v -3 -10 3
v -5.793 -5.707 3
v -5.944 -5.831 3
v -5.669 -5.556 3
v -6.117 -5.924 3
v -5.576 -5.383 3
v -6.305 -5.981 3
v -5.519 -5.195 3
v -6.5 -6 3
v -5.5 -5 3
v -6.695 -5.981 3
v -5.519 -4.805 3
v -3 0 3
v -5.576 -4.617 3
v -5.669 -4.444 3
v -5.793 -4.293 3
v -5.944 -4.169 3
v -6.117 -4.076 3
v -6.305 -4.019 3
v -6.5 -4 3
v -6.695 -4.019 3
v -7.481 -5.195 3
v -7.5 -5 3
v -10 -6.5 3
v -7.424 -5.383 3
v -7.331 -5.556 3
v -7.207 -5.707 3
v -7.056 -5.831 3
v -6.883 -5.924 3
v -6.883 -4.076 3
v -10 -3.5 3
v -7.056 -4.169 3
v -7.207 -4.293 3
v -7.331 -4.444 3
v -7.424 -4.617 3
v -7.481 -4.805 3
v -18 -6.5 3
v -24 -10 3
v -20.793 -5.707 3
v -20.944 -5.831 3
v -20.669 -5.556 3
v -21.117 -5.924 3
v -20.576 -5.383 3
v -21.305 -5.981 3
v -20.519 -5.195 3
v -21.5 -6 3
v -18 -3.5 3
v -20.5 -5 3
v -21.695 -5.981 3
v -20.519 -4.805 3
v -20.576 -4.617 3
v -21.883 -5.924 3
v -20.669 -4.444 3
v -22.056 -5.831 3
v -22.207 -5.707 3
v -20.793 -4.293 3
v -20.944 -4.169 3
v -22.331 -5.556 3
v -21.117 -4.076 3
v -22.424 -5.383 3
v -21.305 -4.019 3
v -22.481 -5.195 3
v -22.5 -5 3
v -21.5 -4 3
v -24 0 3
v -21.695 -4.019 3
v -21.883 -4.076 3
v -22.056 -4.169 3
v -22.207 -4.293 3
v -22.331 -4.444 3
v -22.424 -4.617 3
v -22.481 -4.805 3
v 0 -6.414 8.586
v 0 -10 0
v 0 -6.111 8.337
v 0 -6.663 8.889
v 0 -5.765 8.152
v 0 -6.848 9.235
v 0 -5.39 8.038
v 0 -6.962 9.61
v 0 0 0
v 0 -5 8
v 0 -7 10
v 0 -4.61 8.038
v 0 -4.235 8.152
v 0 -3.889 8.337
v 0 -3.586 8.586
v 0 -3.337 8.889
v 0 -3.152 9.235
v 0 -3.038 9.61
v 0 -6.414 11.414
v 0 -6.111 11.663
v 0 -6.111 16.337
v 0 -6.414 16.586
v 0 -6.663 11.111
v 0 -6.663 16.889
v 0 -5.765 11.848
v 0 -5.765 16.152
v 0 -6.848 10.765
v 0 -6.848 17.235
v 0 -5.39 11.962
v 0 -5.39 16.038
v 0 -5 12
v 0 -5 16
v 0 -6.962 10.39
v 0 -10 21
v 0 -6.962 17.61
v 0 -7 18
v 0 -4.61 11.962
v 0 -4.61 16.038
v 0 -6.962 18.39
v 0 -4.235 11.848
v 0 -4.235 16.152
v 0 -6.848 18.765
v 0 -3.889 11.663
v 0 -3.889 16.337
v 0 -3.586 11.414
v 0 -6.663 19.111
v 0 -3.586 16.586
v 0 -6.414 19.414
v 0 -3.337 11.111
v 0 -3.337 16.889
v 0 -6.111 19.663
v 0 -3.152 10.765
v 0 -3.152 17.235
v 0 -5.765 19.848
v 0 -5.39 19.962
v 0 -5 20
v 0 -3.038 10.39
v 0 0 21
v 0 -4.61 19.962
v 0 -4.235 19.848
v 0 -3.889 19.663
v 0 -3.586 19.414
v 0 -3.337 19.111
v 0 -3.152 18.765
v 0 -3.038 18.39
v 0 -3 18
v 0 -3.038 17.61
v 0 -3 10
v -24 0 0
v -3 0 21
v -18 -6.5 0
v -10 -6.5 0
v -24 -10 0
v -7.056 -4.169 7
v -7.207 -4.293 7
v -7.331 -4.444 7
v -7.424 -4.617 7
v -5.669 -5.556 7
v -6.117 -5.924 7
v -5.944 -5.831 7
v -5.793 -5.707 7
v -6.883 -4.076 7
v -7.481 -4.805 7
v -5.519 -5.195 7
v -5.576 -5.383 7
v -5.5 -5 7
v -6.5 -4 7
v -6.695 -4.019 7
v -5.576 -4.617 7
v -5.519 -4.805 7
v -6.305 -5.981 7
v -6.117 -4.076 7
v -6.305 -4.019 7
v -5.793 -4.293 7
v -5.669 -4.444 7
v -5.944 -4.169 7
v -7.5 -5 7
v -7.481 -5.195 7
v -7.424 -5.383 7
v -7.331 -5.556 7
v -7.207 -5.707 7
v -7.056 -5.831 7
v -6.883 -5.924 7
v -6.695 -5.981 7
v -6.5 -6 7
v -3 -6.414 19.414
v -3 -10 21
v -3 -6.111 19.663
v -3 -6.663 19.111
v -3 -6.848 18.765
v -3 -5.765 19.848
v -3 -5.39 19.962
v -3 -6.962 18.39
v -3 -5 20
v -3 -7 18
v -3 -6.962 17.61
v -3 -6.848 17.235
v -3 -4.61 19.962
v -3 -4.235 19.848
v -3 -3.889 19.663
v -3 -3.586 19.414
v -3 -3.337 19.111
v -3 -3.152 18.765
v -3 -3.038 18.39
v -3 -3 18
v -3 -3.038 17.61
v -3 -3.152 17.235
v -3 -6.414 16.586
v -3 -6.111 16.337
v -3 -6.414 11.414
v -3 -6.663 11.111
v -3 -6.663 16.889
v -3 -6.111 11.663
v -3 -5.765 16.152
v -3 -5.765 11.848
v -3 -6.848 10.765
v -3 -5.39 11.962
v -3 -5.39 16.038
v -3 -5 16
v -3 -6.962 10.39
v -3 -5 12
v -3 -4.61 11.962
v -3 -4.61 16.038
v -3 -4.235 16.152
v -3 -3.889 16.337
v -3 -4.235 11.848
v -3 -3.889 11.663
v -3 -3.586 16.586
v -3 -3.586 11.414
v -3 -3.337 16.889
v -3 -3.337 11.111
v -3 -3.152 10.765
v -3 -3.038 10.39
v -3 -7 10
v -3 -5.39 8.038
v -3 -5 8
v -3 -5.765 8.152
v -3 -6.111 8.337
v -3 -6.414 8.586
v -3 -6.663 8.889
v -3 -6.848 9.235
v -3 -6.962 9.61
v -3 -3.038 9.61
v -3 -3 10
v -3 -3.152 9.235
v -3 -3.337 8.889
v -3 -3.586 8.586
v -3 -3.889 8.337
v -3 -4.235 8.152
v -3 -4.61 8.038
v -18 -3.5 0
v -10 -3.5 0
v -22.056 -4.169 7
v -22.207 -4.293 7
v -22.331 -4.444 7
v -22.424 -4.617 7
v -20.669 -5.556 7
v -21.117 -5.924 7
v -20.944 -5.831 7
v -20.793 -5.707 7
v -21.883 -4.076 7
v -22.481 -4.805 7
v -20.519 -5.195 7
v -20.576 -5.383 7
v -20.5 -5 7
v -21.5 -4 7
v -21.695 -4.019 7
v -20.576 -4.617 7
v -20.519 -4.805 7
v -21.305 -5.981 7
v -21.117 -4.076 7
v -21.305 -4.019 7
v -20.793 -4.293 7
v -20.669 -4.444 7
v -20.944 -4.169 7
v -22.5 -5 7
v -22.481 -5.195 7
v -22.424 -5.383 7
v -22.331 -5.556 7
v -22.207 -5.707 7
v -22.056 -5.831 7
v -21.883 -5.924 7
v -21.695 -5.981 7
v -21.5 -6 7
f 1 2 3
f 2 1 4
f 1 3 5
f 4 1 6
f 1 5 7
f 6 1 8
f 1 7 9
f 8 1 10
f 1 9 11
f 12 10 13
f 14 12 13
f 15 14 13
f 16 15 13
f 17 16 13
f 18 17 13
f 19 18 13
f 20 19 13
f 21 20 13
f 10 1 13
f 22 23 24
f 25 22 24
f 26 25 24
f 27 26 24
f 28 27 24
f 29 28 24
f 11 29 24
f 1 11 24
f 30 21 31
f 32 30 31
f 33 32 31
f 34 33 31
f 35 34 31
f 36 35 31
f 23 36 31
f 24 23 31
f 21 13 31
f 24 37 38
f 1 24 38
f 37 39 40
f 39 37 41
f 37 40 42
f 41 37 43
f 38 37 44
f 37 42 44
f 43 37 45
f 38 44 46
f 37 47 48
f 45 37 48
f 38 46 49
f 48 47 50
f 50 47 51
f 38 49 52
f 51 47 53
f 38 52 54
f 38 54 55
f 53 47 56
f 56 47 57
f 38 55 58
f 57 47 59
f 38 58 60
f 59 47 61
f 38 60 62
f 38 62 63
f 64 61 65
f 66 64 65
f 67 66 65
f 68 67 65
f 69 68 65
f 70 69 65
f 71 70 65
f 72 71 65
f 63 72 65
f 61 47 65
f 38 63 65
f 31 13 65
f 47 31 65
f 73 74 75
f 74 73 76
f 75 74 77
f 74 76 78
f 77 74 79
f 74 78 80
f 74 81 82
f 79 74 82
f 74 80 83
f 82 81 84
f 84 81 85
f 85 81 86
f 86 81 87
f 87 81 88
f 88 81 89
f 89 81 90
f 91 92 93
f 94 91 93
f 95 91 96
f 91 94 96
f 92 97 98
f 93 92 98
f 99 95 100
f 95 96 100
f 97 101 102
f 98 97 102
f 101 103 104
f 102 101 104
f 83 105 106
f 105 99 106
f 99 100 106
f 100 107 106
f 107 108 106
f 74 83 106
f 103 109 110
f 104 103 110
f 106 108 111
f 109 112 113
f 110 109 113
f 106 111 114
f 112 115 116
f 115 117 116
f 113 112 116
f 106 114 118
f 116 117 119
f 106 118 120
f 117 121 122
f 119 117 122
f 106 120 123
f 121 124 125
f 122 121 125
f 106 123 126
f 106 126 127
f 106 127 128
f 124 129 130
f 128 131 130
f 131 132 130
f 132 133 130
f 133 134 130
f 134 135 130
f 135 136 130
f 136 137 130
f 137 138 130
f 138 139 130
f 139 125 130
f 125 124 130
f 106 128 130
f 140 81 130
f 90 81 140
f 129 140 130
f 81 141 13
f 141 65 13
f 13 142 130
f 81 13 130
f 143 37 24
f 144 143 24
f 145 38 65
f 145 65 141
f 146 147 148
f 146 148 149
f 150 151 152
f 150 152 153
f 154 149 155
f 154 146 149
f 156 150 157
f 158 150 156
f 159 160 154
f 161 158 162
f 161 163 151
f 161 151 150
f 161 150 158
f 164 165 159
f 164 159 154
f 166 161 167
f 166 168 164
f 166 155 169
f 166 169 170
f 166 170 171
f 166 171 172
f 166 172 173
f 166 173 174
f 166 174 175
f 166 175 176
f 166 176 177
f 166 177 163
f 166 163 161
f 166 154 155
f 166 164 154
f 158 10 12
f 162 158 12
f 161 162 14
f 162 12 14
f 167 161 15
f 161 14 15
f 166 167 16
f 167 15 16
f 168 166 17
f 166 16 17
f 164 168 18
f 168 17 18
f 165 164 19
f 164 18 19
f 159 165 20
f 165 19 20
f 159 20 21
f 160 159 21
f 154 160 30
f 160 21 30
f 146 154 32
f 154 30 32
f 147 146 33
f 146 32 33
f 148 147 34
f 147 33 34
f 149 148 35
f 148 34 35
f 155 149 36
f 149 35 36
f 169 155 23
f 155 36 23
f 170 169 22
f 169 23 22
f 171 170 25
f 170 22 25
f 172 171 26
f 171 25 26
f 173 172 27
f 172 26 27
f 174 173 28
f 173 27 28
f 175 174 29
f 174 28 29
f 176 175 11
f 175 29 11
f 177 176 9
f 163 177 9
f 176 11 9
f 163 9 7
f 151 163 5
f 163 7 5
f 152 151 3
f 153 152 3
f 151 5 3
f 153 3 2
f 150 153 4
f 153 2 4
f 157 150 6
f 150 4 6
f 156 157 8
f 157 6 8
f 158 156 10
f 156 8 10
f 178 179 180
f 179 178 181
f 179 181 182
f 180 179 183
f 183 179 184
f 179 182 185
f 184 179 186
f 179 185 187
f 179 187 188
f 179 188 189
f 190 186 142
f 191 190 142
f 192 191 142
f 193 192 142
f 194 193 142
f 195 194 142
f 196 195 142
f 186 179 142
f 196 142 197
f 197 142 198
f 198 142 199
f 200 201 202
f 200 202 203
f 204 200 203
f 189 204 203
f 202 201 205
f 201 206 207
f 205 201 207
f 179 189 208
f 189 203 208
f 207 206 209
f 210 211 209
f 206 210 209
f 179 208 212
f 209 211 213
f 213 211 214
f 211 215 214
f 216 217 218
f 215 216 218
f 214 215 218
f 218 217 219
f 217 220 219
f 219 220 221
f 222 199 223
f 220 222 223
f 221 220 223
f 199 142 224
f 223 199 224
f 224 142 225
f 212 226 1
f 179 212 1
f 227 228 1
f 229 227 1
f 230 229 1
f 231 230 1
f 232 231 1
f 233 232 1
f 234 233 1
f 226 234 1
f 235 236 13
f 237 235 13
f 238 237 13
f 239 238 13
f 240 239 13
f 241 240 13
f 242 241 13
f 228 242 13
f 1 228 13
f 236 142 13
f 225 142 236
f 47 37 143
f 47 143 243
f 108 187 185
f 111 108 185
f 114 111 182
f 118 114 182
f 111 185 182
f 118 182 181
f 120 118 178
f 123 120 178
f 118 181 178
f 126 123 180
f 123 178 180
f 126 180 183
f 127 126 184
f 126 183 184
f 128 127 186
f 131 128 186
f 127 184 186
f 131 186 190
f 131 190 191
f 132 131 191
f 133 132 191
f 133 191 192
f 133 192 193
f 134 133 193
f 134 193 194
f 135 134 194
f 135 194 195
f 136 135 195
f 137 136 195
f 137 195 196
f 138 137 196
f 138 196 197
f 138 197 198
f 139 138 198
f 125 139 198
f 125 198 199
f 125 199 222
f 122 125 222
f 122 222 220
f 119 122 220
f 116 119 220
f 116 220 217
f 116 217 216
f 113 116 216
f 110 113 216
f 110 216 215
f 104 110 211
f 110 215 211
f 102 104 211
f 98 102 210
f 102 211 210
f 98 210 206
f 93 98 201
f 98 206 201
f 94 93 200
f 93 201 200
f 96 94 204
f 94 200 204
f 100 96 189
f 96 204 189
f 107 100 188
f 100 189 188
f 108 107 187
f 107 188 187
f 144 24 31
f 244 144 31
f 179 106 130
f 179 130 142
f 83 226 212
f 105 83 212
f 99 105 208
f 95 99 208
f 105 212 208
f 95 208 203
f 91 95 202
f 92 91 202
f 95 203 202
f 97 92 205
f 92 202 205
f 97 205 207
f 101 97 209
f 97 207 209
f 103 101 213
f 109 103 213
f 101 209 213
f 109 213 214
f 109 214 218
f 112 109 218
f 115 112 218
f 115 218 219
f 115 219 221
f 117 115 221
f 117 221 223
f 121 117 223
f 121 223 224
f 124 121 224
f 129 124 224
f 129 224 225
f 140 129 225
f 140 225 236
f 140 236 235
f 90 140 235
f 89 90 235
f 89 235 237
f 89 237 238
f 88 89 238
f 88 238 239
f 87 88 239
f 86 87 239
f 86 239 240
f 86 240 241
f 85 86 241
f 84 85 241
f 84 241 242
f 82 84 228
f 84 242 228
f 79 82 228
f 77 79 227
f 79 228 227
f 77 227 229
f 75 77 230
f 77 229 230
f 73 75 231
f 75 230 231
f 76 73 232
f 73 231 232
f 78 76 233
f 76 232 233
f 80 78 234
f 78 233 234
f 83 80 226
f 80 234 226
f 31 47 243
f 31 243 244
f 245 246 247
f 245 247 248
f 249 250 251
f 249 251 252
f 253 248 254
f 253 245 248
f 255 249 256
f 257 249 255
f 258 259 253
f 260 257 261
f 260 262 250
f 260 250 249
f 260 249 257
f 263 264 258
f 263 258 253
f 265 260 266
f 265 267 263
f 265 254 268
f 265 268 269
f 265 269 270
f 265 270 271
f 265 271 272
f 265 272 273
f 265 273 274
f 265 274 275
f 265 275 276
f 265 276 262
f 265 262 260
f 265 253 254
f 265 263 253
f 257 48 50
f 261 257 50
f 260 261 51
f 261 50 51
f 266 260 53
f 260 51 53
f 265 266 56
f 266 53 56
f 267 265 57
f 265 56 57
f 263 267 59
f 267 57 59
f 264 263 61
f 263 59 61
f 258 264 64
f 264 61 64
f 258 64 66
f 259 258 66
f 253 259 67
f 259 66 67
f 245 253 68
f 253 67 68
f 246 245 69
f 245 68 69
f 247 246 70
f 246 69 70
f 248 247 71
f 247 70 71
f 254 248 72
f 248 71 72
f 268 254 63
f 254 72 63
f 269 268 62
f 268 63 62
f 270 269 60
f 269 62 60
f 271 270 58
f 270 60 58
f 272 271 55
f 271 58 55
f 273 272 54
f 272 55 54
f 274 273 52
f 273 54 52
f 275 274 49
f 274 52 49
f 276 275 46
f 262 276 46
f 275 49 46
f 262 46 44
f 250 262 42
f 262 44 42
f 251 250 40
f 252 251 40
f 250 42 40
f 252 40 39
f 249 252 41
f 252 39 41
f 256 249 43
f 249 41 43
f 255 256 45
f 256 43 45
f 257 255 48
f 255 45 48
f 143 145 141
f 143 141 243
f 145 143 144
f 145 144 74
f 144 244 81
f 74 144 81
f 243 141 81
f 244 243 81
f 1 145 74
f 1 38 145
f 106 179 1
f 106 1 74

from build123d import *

# Parameters (mm, degrees)
F1_DEPTH = 10
F2_R     = 1
F3_DEPTH = 4
F4_W     = 8
F4_H     = 3
F5_DEPTH = 25
F6_R     = 2
F7_DEPTH = 25


with BuildPart() as f1:
    # F0 (on Front) → F1 (new body)
    with BuildSketch(Plane.XZ):
        Polygon((-24, 0), (0, 0), (0, 21), (-3, 21), (-3, 3), (-24, 3), align=None)
    extrude(amount=F1_DEPTH)

    # F2 (on face) → F3 (join)
    with BuildSketch(Plane.XY.offset(3)):
        with Locations((-21.5, -5)):
            Circle(F2_R)
        with Locations((-6.5, -5)):
            Circle(F2_R)
    extrude(amount=F3_DEPTH)

    # F4 (on face) → F5 (cut)
    with BuildSketch(Plane.XY.offset(3)):
        with Locations((-14, -5)):
            Rectangle(F4_W, F4_H)
    extrude(amount=-F5_DEPTH, mode=Mode.SUBTRACT)

    # F6 (on face) → F7 (cut)
    with BuildSketch(Plane(origin=(-3, 0, 0), x_dir=(0, -1, 0), z_dir=(-1, 0, 0))):
        with Locations((5, 18)):
            Circle(F6_R)
        with Locations((5, 10)):
            Circle(F6_R)
    extrude(amount=-F7_DEPTH, mode=Mode.SUBTRACT)


solid = f1.part
